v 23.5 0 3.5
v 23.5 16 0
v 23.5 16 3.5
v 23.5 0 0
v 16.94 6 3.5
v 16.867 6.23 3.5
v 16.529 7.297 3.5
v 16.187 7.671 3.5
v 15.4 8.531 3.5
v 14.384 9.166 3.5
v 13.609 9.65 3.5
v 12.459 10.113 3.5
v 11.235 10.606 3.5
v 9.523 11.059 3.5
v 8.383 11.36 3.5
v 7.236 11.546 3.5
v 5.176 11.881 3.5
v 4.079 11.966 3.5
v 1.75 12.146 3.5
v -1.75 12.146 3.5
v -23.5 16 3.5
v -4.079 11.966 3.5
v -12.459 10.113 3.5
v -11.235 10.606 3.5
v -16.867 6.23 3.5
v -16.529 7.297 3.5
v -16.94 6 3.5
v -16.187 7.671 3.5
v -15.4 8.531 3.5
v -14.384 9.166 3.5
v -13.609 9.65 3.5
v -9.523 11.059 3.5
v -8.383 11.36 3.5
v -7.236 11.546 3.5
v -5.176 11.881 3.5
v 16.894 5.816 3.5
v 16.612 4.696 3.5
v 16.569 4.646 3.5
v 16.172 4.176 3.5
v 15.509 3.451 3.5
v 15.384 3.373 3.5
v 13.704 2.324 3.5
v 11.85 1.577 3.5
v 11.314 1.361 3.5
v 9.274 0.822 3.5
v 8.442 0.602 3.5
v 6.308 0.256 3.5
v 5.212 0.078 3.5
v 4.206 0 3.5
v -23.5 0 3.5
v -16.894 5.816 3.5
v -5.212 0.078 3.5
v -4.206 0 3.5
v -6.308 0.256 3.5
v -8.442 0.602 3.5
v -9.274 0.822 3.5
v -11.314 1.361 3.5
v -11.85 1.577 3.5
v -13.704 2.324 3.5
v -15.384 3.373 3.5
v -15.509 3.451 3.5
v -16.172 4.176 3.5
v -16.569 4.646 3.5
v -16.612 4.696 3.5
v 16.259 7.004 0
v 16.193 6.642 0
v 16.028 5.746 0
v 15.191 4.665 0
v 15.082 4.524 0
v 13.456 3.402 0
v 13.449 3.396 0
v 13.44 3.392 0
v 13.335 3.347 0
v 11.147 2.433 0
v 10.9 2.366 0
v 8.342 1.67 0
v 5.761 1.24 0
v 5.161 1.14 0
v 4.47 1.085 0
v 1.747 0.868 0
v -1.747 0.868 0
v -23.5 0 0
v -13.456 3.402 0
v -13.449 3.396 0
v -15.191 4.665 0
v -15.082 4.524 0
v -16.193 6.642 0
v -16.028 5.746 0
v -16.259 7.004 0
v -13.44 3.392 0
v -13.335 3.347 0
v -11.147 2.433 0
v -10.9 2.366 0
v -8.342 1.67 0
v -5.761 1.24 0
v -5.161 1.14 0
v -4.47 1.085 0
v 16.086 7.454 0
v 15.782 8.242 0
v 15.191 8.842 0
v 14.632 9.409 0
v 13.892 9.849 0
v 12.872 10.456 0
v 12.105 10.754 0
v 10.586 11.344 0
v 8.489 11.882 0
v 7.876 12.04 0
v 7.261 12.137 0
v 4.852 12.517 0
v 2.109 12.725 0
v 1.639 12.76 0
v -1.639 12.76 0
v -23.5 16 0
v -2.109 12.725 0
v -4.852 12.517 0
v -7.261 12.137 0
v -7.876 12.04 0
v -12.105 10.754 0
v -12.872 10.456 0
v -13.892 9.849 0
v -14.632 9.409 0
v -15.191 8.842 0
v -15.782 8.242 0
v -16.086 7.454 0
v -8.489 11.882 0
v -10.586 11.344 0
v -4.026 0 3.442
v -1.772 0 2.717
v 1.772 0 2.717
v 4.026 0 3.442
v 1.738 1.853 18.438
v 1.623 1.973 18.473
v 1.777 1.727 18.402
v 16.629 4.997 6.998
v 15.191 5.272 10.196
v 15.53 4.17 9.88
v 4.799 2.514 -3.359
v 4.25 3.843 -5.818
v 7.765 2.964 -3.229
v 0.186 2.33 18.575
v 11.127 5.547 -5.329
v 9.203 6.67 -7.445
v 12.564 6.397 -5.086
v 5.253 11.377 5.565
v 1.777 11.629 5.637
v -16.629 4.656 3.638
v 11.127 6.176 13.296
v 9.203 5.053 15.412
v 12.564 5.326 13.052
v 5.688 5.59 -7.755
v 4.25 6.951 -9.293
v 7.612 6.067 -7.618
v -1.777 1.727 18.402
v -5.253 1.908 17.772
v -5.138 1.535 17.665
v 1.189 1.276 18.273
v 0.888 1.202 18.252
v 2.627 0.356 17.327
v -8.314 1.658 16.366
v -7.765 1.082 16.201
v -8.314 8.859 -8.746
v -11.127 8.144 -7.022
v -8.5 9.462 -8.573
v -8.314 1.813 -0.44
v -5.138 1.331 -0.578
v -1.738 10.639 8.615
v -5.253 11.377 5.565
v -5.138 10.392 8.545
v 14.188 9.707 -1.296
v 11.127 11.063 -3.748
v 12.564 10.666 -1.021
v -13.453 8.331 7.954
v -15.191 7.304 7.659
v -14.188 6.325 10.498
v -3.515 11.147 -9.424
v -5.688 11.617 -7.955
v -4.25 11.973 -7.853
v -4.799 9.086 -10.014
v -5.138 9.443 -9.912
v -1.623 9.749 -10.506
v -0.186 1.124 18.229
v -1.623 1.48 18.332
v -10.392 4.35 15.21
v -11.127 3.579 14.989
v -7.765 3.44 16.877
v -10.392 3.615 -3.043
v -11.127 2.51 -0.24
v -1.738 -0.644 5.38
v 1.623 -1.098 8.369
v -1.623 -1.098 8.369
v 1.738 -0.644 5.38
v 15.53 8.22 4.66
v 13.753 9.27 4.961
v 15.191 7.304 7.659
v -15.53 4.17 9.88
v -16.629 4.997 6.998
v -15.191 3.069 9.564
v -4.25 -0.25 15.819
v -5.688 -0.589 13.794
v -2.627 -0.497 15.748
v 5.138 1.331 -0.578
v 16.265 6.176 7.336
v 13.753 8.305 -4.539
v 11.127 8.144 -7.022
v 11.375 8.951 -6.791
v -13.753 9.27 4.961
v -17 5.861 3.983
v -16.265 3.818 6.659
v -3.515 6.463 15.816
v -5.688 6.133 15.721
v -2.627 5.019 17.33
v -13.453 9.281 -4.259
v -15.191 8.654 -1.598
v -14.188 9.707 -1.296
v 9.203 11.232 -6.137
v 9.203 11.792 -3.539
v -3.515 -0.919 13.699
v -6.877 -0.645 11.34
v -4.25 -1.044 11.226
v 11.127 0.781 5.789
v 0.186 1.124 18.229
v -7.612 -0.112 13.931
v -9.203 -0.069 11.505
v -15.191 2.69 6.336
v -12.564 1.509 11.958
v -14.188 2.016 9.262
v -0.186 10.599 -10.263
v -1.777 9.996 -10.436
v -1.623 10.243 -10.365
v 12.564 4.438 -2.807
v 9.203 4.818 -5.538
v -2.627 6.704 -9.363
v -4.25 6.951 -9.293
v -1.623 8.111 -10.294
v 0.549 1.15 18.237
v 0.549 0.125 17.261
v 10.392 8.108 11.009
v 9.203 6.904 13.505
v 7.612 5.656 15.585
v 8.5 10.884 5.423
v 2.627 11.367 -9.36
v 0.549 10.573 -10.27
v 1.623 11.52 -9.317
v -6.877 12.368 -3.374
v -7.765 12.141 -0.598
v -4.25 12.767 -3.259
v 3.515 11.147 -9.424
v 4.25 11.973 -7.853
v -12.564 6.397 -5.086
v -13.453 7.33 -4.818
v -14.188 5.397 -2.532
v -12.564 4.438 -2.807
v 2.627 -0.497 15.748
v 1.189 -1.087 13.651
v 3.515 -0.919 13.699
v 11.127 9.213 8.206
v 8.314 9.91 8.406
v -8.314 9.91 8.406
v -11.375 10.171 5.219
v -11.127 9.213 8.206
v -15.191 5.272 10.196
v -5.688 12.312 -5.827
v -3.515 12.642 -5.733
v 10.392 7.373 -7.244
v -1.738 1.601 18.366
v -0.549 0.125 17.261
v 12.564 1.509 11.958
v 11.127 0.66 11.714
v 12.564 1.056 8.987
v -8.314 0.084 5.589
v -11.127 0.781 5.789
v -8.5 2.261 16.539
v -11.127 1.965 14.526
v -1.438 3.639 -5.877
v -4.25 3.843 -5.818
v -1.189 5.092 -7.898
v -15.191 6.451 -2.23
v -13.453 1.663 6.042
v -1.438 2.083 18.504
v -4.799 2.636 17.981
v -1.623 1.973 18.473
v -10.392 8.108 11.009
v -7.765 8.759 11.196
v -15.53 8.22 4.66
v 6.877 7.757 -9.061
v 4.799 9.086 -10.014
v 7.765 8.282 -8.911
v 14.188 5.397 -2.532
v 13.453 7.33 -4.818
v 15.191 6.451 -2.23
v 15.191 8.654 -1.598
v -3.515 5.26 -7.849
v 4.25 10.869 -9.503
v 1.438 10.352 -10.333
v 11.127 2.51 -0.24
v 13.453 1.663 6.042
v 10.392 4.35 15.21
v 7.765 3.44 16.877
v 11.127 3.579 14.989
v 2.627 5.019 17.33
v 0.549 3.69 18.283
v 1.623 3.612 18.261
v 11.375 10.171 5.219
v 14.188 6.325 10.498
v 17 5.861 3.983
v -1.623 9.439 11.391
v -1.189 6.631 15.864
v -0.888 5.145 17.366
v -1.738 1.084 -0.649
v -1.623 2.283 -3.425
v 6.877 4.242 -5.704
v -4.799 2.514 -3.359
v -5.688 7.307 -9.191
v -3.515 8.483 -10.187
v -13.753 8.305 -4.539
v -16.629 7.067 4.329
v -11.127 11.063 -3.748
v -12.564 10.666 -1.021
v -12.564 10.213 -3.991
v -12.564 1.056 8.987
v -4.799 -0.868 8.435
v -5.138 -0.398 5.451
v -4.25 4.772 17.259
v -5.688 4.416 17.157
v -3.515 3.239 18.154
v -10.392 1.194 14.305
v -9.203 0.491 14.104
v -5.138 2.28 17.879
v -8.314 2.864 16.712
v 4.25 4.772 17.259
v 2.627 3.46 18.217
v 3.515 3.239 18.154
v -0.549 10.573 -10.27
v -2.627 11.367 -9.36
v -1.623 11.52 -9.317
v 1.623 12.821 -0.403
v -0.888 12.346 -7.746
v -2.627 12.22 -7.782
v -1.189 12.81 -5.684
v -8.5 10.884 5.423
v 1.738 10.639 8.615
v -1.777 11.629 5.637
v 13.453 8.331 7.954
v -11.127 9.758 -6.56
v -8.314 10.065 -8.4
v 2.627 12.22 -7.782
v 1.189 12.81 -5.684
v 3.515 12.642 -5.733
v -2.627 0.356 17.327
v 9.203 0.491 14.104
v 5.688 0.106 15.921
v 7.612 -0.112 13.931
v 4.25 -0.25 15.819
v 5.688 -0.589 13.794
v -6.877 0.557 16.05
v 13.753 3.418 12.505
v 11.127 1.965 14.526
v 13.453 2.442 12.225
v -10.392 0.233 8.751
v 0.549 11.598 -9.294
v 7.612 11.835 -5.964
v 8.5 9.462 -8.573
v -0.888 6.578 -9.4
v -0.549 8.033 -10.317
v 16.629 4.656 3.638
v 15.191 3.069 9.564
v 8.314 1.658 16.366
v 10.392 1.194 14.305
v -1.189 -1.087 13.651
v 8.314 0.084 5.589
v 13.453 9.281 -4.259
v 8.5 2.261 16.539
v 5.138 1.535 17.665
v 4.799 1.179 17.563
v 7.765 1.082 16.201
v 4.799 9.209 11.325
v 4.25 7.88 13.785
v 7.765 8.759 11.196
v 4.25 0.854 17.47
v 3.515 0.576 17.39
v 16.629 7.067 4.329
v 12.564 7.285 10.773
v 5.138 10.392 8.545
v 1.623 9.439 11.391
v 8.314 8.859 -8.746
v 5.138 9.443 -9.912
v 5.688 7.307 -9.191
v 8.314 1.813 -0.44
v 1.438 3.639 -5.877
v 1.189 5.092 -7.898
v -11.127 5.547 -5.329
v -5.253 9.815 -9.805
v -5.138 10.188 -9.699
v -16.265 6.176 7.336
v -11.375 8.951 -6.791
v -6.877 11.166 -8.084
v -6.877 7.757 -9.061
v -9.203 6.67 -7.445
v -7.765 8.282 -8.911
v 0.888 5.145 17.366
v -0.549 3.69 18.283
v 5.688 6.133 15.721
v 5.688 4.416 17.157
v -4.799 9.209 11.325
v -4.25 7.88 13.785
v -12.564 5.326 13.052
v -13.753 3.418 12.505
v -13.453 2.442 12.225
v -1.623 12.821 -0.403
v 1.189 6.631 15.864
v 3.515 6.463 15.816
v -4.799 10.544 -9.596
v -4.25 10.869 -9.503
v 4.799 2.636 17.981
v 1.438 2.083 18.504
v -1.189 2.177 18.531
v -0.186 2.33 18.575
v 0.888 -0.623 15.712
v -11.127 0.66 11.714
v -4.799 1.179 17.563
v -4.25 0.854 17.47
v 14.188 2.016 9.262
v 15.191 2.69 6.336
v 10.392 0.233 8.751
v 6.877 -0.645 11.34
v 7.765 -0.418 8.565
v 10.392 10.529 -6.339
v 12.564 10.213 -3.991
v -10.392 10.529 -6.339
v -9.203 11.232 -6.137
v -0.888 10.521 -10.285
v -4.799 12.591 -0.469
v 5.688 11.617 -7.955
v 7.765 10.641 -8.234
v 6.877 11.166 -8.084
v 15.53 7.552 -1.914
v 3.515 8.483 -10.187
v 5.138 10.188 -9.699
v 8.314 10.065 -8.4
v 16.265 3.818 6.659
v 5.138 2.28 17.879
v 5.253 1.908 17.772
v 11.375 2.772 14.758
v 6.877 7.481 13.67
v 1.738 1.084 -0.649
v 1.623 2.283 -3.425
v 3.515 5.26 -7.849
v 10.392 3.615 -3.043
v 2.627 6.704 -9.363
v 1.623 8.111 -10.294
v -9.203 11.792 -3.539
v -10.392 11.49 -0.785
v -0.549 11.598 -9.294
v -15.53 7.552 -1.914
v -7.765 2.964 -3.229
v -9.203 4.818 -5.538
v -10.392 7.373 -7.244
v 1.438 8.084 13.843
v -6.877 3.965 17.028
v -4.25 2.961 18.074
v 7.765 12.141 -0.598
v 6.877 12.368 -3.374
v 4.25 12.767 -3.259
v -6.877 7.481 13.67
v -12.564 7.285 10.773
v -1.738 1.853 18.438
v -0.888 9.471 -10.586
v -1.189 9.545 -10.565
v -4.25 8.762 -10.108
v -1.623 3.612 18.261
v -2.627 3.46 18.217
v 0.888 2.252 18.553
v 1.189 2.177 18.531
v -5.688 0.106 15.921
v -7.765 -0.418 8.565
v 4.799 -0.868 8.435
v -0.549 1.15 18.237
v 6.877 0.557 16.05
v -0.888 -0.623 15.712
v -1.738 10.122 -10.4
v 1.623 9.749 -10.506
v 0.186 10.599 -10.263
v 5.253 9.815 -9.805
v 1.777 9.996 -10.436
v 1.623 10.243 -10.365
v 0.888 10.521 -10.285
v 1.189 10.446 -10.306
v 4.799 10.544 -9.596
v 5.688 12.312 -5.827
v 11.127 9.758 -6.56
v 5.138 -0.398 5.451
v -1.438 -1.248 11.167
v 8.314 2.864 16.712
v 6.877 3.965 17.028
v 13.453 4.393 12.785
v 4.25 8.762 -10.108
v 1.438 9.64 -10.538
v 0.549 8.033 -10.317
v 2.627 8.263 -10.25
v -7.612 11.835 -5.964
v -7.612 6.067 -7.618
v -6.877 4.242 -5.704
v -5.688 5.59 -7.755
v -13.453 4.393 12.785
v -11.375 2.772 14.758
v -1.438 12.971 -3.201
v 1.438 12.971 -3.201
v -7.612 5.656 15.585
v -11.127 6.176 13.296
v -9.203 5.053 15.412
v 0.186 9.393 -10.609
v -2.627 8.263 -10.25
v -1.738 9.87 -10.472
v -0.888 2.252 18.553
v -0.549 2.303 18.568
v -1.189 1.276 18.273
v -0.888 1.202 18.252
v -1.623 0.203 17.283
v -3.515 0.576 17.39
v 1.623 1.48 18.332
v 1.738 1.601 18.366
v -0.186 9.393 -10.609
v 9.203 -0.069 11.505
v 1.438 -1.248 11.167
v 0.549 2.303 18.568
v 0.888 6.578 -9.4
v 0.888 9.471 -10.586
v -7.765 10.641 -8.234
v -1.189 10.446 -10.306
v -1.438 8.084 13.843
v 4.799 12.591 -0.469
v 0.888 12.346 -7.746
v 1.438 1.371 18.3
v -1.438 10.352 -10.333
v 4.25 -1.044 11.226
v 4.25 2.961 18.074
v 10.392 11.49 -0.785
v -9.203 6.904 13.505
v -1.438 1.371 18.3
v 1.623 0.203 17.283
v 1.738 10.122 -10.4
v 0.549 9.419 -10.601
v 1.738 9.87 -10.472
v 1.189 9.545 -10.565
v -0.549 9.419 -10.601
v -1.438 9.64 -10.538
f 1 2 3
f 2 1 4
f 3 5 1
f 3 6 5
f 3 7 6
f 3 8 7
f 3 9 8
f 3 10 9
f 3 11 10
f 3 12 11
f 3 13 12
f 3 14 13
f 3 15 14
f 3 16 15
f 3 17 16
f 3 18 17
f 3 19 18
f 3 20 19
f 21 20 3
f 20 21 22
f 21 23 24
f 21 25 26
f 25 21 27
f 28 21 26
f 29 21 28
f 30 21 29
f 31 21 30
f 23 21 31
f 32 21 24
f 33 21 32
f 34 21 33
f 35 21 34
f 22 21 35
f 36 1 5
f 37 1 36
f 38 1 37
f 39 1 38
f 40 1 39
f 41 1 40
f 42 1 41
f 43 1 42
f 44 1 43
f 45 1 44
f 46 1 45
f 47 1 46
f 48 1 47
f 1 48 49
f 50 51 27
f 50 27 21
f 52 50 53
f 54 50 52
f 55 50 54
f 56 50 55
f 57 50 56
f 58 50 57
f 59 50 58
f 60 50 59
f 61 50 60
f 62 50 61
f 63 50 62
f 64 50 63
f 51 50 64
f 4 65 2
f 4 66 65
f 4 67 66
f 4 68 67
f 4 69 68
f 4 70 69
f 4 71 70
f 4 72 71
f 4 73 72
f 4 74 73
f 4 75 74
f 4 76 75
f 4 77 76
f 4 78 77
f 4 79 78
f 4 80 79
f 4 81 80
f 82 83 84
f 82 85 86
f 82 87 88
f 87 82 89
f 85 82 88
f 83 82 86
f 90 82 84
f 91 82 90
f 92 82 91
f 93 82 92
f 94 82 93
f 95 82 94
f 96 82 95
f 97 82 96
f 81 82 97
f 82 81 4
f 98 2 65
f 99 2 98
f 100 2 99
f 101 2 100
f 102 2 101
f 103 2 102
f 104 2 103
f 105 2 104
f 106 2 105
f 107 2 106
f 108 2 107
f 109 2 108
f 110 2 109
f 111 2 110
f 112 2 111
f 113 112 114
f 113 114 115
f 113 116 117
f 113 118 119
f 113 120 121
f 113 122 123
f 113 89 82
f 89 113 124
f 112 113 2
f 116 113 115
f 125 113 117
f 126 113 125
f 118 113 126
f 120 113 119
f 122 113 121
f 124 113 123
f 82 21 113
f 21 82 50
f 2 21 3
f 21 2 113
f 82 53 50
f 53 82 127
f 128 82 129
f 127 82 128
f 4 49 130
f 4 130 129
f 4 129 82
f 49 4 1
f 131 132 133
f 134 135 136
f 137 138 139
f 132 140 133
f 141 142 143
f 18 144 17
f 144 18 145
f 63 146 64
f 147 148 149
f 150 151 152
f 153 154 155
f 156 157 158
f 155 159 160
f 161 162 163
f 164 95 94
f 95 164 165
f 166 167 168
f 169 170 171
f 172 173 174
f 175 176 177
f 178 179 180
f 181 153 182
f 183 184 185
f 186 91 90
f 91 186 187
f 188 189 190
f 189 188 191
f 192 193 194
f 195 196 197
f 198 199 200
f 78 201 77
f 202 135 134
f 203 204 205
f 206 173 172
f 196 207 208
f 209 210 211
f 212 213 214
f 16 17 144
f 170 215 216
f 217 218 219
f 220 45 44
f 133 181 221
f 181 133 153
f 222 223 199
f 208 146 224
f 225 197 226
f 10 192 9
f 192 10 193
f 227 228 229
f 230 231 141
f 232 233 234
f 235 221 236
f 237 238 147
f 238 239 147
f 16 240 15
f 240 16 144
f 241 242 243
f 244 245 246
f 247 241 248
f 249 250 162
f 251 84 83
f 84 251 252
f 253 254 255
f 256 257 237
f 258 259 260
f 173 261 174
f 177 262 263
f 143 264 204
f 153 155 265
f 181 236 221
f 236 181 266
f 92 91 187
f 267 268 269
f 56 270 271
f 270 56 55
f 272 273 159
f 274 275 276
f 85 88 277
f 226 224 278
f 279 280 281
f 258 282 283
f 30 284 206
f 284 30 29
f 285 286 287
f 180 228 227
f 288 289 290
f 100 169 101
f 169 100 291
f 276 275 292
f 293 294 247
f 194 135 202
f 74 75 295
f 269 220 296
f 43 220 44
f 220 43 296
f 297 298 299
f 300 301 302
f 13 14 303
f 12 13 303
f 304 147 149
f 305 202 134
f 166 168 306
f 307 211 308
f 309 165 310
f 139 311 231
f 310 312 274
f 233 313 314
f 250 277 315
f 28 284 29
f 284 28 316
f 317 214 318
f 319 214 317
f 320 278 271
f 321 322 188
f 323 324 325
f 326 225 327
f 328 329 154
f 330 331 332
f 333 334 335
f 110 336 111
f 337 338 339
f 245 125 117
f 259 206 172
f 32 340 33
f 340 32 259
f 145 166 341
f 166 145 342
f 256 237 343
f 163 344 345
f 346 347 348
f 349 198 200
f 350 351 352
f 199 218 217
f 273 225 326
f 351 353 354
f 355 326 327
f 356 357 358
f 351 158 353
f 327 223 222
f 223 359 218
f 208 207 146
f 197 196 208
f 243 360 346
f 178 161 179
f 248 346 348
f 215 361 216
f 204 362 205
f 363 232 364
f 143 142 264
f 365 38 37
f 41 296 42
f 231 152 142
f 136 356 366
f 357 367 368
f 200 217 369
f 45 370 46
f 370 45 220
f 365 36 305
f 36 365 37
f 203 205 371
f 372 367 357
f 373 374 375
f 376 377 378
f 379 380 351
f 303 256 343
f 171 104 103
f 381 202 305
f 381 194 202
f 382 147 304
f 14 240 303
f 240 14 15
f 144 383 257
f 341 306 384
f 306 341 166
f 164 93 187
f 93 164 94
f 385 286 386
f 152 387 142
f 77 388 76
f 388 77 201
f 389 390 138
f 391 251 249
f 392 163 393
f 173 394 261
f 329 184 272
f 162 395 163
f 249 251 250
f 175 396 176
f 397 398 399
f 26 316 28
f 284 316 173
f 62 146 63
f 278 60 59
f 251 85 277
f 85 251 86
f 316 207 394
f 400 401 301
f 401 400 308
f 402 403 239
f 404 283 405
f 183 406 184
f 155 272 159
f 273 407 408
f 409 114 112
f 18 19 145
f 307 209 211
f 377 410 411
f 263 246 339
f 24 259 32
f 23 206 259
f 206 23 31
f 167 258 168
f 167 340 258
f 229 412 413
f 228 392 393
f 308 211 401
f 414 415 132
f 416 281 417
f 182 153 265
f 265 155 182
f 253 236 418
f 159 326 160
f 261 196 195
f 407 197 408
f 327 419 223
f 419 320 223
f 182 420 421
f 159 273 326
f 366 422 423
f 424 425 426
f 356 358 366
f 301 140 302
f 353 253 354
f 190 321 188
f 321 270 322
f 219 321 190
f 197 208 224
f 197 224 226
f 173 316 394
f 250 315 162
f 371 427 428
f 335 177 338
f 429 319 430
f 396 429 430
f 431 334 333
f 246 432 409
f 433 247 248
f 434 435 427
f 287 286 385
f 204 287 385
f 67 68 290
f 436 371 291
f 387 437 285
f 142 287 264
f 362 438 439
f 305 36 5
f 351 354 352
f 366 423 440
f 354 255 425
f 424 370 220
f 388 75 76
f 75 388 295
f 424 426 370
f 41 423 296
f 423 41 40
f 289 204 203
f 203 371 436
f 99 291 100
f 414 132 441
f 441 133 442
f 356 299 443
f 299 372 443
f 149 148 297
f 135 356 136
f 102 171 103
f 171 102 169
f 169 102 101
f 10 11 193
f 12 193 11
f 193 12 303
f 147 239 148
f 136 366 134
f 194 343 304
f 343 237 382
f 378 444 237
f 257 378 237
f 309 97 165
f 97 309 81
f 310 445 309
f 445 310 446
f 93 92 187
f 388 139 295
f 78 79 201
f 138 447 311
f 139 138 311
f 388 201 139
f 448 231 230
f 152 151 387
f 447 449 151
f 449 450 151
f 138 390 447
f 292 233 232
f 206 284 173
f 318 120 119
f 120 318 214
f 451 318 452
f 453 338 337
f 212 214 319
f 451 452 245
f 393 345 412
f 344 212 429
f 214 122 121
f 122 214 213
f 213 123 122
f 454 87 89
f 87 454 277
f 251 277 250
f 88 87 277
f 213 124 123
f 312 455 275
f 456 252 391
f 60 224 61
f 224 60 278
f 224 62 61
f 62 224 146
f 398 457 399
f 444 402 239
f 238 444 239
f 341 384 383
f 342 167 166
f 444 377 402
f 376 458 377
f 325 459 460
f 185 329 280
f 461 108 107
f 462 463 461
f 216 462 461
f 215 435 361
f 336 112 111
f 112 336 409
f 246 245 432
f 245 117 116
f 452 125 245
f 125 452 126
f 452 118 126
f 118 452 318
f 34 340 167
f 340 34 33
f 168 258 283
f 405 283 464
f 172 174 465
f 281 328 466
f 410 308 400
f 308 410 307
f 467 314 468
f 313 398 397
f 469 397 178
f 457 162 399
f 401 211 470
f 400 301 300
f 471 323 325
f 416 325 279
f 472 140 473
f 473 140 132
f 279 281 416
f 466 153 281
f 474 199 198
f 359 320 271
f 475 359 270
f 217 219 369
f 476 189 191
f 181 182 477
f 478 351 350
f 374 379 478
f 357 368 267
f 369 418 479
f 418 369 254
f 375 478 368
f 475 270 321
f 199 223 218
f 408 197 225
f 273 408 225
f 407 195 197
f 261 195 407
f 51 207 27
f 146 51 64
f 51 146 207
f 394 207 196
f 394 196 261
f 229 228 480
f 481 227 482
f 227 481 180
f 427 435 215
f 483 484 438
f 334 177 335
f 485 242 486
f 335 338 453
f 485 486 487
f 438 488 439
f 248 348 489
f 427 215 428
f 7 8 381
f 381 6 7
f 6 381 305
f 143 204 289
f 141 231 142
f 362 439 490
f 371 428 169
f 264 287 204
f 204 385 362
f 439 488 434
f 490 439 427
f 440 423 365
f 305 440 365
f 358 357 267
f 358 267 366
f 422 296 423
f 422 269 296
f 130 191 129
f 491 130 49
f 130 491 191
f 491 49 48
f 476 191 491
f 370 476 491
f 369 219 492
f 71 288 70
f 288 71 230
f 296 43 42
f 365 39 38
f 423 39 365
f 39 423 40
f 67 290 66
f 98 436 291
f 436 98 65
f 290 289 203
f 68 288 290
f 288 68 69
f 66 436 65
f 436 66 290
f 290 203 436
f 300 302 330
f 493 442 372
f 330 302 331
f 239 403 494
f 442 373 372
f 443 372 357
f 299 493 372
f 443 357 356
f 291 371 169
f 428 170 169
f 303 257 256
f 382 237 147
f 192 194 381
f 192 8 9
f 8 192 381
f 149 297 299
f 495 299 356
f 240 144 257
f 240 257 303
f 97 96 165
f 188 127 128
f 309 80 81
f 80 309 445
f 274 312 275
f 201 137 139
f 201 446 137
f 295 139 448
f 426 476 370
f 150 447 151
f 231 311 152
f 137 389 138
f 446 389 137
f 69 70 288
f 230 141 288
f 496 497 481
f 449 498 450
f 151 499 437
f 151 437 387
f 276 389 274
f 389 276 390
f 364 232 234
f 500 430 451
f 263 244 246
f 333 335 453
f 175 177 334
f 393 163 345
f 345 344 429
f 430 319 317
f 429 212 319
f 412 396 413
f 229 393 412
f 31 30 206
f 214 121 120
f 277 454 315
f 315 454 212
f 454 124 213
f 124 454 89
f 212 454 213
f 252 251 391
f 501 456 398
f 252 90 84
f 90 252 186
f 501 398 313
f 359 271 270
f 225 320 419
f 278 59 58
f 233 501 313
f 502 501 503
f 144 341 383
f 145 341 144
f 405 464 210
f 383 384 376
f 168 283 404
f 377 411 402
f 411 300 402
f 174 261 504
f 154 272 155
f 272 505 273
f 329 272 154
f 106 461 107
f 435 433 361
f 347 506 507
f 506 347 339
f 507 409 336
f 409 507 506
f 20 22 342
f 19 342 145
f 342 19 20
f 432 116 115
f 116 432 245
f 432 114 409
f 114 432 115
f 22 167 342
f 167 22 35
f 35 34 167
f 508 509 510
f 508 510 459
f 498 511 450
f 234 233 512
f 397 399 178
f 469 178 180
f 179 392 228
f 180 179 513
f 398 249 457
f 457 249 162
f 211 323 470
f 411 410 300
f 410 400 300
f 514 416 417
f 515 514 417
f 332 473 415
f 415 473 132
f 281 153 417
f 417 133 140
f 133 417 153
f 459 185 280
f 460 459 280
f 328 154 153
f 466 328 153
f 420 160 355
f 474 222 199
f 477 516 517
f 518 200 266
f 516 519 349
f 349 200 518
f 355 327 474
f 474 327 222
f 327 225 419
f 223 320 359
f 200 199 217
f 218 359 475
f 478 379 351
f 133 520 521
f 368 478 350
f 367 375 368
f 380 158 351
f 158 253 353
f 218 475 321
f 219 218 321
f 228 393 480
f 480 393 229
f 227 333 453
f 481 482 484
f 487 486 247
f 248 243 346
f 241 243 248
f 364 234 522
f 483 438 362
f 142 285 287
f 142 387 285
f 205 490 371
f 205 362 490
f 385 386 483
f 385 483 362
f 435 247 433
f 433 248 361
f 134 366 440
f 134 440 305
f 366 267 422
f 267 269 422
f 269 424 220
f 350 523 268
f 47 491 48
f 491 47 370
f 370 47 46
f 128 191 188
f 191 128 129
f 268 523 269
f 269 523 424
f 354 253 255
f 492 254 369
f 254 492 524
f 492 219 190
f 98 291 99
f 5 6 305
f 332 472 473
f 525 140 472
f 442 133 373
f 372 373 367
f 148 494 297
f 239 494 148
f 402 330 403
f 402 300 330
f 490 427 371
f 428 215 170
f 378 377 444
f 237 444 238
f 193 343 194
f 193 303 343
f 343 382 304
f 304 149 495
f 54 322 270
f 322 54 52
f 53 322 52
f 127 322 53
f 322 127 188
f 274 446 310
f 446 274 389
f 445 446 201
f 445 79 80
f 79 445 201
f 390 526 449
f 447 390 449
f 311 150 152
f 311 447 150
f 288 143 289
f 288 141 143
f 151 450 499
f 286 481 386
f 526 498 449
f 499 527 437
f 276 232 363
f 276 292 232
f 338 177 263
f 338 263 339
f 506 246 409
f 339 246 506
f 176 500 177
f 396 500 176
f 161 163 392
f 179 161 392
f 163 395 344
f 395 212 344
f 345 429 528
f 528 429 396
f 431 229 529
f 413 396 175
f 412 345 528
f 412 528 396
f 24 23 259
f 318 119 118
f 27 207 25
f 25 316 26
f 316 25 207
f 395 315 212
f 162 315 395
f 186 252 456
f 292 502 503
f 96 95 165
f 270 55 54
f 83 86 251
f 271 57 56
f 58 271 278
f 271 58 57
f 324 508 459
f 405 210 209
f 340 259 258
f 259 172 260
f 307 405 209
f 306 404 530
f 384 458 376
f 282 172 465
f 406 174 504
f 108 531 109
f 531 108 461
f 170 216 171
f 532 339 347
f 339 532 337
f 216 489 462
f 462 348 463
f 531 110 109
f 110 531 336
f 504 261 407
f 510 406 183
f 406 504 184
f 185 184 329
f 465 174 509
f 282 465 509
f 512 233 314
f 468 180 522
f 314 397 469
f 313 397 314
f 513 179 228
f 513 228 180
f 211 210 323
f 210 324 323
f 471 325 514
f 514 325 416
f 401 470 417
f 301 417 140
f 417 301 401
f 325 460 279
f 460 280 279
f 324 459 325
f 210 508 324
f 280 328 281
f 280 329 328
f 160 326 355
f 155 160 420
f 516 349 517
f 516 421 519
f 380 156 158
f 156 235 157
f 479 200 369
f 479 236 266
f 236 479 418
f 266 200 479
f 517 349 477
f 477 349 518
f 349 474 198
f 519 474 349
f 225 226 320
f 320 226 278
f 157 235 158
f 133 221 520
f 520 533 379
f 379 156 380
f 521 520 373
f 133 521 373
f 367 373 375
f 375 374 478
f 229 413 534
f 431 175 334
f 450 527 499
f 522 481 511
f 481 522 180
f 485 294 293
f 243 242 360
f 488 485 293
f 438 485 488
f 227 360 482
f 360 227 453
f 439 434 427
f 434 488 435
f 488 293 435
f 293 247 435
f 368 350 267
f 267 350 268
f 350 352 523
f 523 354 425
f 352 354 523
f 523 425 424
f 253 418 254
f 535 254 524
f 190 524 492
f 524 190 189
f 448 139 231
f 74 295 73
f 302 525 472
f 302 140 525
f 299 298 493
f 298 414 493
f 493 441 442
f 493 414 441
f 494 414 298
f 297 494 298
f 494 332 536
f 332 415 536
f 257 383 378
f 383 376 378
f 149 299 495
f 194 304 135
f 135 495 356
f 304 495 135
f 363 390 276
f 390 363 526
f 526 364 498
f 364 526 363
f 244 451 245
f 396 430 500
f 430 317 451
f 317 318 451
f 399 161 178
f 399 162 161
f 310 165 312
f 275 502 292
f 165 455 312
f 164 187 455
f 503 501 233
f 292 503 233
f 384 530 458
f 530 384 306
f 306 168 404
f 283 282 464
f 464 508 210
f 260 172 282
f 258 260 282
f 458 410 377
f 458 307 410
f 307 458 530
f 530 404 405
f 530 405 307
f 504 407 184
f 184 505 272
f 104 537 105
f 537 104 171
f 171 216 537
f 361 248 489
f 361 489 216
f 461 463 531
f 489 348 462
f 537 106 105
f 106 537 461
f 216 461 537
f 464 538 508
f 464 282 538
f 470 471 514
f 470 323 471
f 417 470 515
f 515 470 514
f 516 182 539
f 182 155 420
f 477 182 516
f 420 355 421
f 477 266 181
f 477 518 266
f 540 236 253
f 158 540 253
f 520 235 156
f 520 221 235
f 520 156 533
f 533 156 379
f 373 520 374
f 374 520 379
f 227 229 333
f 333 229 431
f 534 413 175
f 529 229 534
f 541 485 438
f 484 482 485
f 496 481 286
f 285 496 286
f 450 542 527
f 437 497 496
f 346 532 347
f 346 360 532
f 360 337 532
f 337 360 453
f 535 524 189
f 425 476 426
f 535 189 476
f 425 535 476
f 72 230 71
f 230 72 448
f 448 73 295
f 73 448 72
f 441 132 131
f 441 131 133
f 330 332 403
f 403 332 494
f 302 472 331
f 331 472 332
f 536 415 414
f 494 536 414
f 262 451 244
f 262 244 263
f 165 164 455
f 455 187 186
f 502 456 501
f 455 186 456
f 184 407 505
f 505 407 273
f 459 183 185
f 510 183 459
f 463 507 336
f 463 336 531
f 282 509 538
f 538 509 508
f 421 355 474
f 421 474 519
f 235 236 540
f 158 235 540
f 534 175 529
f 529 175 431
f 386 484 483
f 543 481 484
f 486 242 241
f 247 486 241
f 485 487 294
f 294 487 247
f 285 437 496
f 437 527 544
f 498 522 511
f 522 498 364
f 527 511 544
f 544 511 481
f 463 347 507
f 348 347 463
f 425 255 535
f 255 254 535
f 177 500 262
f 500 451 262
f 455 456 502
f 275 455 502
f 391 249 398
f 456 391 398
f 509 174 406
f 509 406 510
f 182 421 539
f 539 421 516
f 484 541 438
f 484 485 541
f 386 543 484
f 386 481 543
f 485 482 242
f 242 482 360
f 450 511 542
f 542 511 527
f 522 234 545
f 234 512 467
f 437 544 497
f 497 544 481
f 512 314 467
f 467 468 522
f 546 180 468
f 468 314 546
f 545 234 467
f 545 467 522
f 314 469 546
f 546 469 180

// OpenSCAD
// ---------------------------------------------------------------------------
// Mitsubishi Pajero center-console armrest UPPER catch / latch  (OEM MR532555)
//
// NOTE ON SOURCE OF TRUTH
// The printable geometry (v3) is generated and VERIFIED by generate_latch.py
// (Python + trimesh): the domed "hood" uses a boolean intersection that is
// checked for watertightness and against OEM-anchored dimensions on every run.
// This environment has no OpenSCAD renderer, so rather than ship an unverified
// port, the authoritative model lives in the Python generator and the exported
// STL/3MF files. The block below documents the parameters so you can tweak and
// regenerate:  python3 generate_latch.py
//
// Real OEM part (from research): ~47 x 34 x 29 mm, hole-to-hole ~35 mm, ~15 g.
// ---------------------------------------------------------------------------

/* [Reference parameters — edit in generate_latch.py] */
MIRROR       = false;  // flip long/short screw ear if the part comes out reversed

// Mounting flange
FLANGE_D     = 16.0;   // depth (Y)
FLANGE_T     = 3.5;    // thickness
FLANGE_R     = 3.0;    // corner radius
EAR_LONG     = 6.0;    // overhang past hole (long side)
EAR_SHORT    = 6.0;    // overhang past hole (short side)

// Countersunk screw holes  (width = HOLE_SPACING + EAR_LONG + EAR_SHORT ~= 47)
HOLE_SPACING = 35.0;   // centre-to-centre (X)
HOLE_Y       = 8.0;    // from the flange back edge (Y)
HOLE_DIA     = 4.6;
CSK_DIA      = 8.0;
CSK_DEPTH    = 2.0;

// Central boss (with hole)
BOSS_W       = 12.0;
BOSS_D       = 9.0;
BOSS_H       = 5.0;
BOSS_HOLE_D  = 4.5;

// Domed hood
HOOD_W       = 34.0;   // width (X)
HOOD_H       = 30.0;   // height along its plane
HOOD_TH      = 12.0;   // thickness
HOOD_R       = 7.0;    // corner radius
HOOD_TILT    = 16.0;   // back-tilt, degrees
HOOD_DOME_R  = 58.0;   // front-face bulge radius
HOOD_TAPER   = 0.82;   // bottom/top width

// Hook / catch
HOOK_W       = 12.0;
HOOK_BAR_Y   = 4.0;
HOOK_BAR_T   = 3.0;
HOOK_LIP_LEN = 6.5;
HOOK_LIP_T   = 2.6;

// Rough placeholder so this file still previews *something* in OpenSCAD.
// (Not the real geometry — see generate_latch.py / the exported STL.)
color("gray") {
    translate([0, FLANGE_D/2, FLANGE_T/2])
        cube([HOLE_SPACING + EAR_LONG + EAR_SHORT, FLANGE_D, FLANGE_T], center=true);
    translate([0, 6, FLANGE_T])
        rotate([HOOD_TILT, 0, 0])
            resize([HOOD_W, HOOD_TH, HOOD_H])
                translate([0,0,0.5]) sphere(d=HOOD_H);
}
